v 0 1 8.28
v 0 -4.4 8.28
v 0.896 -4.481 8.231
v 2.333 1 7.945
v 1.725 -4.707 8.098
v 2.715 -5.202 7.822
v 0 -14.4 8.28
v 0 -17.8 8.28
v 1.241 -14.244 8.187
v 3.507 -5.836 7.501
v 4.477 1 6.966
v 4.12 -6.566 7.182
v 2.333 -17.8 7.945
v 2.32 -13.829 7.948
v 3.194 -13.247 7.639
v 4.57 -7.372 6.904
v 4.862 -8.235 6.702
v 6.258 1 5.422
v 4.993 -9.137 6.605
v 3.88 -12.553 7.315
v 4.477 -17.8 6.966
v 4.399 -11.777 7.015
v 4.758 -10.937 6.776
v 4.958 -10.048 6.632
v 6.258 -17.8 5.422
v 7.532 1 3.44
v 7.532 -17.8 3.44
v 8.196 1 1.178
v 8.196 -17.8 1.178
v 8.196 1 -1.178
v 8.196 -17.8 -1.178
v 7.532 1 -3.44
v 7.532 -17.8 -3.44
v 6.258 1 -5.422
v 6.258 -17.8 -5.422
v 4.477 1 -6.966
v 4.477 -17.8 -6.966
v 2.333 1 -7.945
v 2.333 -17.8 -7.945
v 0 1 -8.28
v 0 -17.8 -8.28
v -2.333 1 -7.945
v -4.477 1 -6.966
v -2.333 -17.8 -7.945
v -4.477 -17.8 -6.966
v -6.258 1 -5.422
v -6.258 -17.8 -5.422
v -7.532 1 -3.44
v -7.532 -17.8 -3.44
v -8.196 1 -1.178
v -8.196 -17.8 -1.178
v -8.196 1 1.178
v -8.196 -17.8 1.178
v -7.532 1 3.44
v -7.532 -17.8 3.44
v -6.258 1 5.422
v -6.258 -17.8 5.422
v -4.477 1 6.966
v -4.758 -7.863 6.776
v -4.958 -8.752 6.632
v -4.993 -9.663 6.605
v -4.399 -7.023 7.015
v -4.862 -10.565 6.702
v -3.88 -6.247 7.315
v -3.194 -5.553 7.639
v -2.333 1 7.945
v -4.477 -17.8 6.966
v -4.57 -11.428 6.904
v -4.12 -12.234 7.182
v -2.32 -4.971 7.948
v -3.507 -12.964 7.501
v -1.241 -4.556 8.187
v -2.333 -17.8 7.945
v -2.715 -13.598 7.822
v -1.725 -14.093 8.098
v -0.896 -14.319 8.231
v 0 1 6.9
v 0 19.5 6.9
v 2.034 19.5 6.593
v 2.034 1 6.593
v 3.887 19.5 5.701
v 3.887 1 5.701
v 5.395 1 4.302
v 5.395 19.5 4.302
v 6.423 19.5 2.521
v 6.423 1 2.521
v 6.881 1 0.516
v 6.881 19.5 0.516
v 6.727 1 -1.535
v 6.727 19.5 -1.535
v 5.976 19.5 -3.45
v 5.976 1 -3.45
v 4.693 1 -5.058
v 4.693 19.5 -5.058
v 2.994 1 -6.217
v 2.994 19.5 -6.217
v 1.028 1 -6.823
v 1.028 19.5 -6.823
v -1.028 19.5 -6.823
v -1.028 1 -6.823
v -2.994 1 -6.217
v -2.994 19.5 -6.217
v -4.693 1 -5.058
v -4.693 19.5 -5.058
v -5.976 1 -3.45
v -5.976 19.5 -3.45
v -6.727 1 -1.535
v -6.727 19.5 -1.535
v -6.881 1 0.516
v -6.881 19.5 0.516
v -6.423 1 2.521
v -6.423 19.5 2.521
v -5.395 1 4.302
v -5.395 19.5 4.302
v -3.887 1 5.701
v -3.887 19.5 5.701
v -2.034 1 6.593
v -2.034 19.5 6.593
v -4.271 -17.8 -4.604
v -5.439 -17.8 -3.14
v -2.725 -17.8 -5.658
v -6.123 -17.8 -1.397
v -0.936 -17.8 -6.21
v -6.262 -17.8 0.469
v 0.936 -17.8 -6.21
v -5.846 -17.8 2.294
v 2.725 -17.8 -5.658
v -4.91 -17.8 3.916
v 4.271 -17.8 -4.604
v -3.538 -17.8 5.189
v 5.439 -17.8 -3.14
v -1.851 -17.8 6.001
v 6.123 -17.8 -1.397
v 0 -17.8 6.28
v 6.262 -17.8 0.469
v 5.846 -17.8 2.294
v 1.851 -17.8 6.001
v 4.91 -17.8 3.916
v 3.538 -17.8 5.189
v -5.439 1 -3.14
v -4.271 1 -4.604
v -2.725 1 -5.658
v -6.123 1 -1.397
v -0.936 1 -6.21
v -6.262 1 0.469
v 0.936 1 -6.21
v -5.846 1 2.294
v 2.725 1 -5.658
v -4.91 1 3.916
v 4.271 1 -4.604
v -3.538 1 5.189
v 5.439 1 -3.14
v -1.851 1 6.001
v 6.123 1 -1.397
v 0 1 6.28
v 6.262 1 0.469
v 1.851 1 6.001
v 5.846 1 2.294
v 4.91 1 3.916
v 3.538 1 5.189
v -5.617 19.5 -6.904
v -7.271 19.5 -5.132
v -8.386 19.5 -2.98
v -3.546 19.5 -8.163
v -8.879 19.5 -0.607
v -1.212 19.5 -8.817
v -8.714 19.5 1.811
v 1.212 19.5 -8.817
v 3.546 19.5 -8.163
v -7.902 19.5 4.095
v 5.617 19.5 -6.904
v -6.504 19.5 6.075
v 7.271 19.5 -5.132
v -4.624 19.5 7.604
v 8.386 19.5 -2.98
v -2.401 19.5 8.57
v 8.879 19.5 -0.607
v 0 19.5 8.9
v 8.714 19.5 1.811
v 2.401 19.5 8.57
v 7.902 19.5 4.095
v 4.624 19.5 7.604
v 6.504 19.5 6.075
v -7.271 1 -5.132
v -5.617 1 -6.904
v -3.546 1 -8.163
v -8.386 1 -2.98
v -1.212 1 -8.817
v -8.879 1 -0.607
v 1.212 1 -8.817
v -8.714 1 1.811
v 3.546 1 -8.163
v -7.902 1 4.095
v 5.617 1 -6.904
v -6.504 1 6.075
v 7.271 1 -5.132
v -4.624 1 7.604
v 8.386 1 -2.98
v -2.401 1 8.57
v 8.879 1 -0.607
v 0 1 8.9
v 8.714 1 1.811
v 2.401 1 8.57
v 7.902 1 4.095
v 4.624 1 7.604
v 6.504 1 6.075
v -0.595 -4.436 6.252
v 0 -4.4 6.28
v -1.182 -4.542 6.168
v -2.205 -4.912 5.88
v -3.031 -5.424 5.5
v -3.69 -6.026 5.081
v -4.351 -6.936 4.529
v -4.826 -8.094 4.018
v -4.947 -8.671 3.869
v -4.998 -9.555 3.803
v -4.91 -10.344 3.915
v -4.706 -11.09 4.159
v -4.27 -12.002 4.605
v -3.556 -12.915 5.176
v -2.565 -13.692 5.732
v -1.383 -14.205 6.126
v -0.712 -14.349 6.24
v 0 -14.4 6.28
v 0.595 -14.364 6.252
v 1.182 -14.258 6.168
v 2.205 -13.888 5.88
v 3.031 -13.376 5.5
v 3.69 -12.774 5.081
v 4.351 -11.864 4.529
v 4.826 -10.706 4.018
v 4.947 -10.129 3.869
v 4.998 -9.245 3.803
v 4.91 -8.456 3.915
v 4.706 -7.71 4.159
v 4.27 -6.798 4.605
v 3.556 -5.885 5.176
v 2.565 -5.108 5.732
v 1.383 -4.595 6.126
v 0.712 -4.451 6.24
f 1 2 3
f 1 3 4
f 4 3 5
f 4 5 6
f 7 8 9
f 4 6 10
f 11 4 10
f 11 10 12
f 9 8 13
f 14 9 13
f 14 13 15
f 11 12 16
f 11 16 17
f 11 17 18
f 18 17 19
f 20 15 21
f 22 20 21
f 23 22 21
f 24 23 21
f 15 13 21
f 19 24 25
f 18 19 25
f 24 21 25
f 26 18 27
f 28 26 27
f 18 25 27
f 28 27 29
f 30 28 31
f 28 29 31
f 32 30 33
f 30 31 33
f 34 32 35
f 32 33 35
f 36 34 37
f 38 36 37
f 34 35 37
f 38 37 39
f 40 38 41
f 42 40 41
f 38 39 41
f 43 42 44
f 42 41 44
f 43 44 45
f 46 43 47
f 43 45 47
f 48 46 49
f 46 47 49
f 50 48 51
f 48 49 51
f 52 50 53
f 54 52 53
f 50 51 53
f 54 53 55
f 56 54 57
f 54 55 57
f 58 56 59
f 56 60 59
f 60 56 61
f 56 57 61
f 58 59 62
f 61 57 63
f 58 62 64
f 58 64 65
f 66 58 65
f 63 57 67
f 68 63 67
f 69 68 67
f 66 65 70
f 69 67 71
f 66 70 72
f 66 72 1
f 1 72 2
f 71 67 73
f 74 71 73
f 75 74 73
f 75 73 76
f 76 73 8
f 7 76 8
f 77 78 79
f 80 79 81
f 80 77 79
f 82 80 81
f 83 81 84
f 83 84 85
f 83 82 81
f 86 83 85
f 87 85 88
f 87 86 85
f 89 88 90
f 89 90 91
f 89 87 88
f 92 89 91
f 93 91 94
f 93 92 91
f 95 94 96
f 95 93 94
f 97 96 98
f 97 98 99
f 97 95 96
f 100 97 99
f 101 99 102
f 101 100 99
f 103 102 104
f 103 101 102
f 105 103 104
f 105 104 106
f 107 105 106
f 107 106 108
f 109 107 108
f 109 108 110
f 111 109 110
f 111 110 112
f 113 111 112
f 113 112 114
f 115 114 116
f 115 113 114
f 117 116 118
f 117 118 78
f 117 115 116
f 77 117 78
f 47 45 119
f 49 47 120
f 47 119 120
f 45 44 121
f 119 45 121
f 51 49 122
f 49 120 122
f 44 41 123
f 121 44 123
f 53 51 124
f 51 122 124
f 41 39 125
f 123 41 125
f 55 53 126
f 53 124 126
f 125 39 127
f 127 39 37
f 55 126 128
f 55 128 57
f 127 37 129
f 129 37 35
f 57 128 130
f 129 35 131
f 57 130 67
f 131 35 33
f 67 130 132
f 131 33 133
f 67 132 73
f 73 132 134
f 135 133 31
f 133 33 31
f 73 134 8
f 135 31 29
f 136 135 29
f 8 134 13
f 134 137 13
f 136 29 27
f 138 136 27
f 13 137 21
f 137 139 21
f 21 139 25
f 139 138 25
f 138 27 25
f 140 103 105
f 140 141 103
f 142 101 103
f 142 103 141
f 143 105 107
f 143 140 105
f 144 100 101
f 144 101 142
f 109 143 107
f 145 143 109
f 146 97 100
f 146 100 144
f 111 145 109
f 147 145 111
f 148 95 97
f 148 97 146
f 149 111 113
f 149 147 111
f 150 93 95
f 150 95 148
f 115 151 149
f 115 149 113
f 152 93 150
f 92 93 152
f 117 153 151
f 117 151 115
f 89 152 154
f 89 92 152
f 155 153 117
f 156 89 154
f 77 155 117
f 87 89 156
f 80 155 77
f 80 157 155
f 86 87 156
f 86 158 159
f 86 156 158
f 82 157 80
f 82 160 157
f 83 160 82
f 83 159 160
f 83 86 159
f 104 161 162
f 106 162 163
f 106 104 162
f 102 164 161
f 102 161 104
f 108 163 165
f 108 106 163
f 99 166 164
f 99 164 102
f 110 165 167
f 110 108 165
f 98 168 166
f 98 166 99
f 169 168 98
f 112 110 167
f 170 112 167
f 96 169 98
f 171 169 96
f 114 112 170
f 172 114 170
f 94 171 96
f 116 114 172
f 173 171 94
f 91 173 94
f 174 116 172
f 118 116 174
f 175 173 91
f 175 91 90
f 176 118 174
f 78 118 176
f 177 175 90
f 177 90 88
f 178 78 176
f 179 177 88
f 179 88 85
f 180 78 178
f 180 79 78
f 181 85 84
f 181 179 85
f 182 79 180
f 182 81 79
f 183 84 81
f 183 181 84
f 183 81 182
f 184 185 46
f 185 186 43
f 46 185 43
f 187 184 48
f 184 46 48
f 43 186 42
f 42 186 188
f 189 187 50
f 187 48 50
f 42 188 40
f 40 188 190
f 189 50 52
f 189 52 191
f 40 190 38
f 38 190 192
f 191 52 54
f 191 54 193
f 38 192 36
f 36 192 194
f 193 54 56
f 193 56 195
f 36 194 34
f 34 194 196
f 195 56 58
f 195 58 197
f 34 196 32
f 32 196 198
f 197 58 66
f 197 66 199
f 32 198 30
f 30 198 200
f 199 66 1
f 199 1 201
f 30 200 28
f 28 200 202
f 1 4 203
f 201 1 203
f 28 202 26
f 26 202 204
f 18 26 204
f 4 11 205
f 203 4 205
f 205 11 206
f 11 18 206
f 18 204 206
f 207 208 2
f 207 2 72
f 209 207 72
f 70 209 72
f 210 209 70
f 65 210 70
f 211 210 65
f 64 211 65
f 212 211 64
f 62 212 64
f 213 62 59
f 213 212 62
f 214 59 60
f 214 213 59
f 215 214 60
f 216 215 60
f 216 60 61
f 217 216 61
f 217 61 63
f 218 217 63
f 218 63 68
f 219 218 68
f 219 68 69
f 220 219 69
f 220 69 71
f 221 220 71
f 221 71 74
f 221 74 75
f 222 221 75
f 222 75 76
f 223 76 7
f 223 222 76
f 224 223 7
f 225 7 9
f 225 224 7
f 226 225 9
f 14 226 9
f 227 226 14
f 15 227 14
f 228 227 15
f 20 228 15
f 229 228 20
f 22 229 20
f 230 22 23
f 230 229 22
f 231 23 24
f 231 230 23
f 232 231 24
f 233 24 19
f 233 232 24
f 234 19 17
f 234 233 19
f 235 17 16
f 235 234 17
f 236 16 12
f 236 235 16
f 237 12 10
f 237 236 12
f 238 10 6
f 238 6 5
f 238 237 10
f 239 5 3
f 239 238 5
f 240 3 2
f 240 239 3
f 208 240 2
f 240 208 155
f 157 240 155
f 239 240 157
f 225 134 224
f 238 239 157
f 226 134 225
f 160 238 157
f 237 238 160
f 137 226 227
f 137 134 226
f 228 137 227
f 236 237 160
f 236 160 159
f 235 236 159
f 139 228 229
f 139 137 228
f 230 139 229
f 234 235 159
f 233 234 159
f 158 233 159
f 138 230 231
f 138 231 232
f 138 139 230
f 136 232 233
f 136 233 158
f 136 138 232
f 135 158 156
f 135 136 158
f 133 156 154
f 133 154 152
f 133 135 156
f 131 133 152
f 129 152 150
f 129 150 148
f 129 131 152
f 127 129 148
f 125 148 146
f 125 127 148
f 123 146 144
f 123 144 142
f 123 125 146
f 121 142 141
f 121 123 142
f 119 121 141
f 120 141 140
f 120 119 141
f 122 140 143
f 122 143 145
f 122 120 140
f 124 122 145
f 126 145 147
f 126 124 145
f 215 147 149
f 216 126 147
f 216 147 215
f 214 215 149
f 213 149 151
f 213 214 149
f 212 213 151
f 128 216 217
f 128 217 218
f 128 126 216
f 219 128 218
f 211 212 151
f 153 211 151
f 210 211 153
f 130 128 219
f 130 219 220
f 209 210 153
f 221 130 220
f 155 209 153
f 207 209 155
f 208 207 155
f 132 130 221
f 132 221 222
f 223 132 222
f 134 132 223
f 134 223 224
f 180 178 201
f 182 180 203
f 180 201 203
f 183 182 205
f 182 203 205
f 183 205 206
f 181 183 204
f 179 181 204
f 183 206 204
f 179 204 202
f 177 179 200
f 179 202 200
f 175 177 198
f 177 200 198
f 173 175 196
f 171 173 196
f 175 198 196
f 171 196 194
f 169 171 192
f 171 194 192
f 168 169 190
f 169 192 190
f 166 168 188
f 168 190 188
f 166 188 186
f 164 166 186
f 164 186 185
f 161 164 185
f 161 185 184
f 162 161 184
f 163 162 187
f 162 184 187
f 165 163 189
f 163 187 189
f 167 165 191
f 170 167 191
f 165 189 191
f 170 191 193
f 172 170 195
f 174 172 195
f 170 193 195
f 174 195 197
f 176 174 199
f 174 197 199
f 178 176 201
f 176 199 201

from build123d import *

# Parameters (mm, degrees)
BOSS_EXTRUDE1_DEPTH      = 1
BOSS_EXTRUDE1_DEPTH_BACK = 17.8
SKETCH1_R                = 8.28
SKETCH1_R_2              = 6.28
SKETCH2_R                = 8.9
SKETCH2_R_2              = 6.9
BOSS_EXTRUDE2_DEPTH      = 18.5
SKETCH3_R                = 5
CUT_EXTRUDE1_DEPTH       = 24.209265391


with BuildPart() as part:
    # Sketch1 → Boss-Extrude1 (new, two sides: drawn at the far end of the back side and taken through both)
    with BuildSketch(Plane(origin=(0, 0, 0), x_dir=(1, 0, 0), z_dir=(0, 1, 0)).offset(-BOSS_EXTRUDE1_DEPTH_BACK)):
        with Locations(Location((0, 0, 0), (0, 0, 270))):
            Circle(SKETCH1_R)
        with Locations(Location((0, 0, 0), (0, 0, 270))):
            Circle(SKETCH1_R_2, mode=Mode.SUBTRACT)
    extrude(amount=BOSS_EXTRUDE1_DEPTH + BOSS_EXTRUDE1_DEPTH_BACK)

    # Sketch2 → Boss-Extrude2 (add)
    with BuildSketch(Plane(origin=(0, 1, 0), x_dir=(1, 0, 0), z_dir=(0, 1, 0))):
        with Locations(Location((0, 0, 0), (0, 0, 270))):
            Circle(SKETCH2_R)
        with Locations(Location((0, 0, 0), (0, 0, 270))):
            Circle(SKETCH2_R_2, mode=Mode.SUBTRACT)
    extrude(amount=BOSS_EXTRUDE2_DEPTH)

    # Sketch3 → Cut-Extrude1 (cut, through all)
    with BuildSketch(Plane.XY):
        with Locations(Location((0, -9.4, 0), (0, 0, 90.000000004))):
            Circle(SKETCH3_R)
    extrude(amount=CUT_EXTRUDE1_DEPTH, mode=Mode.SUBTRACT)


solid = part.part
